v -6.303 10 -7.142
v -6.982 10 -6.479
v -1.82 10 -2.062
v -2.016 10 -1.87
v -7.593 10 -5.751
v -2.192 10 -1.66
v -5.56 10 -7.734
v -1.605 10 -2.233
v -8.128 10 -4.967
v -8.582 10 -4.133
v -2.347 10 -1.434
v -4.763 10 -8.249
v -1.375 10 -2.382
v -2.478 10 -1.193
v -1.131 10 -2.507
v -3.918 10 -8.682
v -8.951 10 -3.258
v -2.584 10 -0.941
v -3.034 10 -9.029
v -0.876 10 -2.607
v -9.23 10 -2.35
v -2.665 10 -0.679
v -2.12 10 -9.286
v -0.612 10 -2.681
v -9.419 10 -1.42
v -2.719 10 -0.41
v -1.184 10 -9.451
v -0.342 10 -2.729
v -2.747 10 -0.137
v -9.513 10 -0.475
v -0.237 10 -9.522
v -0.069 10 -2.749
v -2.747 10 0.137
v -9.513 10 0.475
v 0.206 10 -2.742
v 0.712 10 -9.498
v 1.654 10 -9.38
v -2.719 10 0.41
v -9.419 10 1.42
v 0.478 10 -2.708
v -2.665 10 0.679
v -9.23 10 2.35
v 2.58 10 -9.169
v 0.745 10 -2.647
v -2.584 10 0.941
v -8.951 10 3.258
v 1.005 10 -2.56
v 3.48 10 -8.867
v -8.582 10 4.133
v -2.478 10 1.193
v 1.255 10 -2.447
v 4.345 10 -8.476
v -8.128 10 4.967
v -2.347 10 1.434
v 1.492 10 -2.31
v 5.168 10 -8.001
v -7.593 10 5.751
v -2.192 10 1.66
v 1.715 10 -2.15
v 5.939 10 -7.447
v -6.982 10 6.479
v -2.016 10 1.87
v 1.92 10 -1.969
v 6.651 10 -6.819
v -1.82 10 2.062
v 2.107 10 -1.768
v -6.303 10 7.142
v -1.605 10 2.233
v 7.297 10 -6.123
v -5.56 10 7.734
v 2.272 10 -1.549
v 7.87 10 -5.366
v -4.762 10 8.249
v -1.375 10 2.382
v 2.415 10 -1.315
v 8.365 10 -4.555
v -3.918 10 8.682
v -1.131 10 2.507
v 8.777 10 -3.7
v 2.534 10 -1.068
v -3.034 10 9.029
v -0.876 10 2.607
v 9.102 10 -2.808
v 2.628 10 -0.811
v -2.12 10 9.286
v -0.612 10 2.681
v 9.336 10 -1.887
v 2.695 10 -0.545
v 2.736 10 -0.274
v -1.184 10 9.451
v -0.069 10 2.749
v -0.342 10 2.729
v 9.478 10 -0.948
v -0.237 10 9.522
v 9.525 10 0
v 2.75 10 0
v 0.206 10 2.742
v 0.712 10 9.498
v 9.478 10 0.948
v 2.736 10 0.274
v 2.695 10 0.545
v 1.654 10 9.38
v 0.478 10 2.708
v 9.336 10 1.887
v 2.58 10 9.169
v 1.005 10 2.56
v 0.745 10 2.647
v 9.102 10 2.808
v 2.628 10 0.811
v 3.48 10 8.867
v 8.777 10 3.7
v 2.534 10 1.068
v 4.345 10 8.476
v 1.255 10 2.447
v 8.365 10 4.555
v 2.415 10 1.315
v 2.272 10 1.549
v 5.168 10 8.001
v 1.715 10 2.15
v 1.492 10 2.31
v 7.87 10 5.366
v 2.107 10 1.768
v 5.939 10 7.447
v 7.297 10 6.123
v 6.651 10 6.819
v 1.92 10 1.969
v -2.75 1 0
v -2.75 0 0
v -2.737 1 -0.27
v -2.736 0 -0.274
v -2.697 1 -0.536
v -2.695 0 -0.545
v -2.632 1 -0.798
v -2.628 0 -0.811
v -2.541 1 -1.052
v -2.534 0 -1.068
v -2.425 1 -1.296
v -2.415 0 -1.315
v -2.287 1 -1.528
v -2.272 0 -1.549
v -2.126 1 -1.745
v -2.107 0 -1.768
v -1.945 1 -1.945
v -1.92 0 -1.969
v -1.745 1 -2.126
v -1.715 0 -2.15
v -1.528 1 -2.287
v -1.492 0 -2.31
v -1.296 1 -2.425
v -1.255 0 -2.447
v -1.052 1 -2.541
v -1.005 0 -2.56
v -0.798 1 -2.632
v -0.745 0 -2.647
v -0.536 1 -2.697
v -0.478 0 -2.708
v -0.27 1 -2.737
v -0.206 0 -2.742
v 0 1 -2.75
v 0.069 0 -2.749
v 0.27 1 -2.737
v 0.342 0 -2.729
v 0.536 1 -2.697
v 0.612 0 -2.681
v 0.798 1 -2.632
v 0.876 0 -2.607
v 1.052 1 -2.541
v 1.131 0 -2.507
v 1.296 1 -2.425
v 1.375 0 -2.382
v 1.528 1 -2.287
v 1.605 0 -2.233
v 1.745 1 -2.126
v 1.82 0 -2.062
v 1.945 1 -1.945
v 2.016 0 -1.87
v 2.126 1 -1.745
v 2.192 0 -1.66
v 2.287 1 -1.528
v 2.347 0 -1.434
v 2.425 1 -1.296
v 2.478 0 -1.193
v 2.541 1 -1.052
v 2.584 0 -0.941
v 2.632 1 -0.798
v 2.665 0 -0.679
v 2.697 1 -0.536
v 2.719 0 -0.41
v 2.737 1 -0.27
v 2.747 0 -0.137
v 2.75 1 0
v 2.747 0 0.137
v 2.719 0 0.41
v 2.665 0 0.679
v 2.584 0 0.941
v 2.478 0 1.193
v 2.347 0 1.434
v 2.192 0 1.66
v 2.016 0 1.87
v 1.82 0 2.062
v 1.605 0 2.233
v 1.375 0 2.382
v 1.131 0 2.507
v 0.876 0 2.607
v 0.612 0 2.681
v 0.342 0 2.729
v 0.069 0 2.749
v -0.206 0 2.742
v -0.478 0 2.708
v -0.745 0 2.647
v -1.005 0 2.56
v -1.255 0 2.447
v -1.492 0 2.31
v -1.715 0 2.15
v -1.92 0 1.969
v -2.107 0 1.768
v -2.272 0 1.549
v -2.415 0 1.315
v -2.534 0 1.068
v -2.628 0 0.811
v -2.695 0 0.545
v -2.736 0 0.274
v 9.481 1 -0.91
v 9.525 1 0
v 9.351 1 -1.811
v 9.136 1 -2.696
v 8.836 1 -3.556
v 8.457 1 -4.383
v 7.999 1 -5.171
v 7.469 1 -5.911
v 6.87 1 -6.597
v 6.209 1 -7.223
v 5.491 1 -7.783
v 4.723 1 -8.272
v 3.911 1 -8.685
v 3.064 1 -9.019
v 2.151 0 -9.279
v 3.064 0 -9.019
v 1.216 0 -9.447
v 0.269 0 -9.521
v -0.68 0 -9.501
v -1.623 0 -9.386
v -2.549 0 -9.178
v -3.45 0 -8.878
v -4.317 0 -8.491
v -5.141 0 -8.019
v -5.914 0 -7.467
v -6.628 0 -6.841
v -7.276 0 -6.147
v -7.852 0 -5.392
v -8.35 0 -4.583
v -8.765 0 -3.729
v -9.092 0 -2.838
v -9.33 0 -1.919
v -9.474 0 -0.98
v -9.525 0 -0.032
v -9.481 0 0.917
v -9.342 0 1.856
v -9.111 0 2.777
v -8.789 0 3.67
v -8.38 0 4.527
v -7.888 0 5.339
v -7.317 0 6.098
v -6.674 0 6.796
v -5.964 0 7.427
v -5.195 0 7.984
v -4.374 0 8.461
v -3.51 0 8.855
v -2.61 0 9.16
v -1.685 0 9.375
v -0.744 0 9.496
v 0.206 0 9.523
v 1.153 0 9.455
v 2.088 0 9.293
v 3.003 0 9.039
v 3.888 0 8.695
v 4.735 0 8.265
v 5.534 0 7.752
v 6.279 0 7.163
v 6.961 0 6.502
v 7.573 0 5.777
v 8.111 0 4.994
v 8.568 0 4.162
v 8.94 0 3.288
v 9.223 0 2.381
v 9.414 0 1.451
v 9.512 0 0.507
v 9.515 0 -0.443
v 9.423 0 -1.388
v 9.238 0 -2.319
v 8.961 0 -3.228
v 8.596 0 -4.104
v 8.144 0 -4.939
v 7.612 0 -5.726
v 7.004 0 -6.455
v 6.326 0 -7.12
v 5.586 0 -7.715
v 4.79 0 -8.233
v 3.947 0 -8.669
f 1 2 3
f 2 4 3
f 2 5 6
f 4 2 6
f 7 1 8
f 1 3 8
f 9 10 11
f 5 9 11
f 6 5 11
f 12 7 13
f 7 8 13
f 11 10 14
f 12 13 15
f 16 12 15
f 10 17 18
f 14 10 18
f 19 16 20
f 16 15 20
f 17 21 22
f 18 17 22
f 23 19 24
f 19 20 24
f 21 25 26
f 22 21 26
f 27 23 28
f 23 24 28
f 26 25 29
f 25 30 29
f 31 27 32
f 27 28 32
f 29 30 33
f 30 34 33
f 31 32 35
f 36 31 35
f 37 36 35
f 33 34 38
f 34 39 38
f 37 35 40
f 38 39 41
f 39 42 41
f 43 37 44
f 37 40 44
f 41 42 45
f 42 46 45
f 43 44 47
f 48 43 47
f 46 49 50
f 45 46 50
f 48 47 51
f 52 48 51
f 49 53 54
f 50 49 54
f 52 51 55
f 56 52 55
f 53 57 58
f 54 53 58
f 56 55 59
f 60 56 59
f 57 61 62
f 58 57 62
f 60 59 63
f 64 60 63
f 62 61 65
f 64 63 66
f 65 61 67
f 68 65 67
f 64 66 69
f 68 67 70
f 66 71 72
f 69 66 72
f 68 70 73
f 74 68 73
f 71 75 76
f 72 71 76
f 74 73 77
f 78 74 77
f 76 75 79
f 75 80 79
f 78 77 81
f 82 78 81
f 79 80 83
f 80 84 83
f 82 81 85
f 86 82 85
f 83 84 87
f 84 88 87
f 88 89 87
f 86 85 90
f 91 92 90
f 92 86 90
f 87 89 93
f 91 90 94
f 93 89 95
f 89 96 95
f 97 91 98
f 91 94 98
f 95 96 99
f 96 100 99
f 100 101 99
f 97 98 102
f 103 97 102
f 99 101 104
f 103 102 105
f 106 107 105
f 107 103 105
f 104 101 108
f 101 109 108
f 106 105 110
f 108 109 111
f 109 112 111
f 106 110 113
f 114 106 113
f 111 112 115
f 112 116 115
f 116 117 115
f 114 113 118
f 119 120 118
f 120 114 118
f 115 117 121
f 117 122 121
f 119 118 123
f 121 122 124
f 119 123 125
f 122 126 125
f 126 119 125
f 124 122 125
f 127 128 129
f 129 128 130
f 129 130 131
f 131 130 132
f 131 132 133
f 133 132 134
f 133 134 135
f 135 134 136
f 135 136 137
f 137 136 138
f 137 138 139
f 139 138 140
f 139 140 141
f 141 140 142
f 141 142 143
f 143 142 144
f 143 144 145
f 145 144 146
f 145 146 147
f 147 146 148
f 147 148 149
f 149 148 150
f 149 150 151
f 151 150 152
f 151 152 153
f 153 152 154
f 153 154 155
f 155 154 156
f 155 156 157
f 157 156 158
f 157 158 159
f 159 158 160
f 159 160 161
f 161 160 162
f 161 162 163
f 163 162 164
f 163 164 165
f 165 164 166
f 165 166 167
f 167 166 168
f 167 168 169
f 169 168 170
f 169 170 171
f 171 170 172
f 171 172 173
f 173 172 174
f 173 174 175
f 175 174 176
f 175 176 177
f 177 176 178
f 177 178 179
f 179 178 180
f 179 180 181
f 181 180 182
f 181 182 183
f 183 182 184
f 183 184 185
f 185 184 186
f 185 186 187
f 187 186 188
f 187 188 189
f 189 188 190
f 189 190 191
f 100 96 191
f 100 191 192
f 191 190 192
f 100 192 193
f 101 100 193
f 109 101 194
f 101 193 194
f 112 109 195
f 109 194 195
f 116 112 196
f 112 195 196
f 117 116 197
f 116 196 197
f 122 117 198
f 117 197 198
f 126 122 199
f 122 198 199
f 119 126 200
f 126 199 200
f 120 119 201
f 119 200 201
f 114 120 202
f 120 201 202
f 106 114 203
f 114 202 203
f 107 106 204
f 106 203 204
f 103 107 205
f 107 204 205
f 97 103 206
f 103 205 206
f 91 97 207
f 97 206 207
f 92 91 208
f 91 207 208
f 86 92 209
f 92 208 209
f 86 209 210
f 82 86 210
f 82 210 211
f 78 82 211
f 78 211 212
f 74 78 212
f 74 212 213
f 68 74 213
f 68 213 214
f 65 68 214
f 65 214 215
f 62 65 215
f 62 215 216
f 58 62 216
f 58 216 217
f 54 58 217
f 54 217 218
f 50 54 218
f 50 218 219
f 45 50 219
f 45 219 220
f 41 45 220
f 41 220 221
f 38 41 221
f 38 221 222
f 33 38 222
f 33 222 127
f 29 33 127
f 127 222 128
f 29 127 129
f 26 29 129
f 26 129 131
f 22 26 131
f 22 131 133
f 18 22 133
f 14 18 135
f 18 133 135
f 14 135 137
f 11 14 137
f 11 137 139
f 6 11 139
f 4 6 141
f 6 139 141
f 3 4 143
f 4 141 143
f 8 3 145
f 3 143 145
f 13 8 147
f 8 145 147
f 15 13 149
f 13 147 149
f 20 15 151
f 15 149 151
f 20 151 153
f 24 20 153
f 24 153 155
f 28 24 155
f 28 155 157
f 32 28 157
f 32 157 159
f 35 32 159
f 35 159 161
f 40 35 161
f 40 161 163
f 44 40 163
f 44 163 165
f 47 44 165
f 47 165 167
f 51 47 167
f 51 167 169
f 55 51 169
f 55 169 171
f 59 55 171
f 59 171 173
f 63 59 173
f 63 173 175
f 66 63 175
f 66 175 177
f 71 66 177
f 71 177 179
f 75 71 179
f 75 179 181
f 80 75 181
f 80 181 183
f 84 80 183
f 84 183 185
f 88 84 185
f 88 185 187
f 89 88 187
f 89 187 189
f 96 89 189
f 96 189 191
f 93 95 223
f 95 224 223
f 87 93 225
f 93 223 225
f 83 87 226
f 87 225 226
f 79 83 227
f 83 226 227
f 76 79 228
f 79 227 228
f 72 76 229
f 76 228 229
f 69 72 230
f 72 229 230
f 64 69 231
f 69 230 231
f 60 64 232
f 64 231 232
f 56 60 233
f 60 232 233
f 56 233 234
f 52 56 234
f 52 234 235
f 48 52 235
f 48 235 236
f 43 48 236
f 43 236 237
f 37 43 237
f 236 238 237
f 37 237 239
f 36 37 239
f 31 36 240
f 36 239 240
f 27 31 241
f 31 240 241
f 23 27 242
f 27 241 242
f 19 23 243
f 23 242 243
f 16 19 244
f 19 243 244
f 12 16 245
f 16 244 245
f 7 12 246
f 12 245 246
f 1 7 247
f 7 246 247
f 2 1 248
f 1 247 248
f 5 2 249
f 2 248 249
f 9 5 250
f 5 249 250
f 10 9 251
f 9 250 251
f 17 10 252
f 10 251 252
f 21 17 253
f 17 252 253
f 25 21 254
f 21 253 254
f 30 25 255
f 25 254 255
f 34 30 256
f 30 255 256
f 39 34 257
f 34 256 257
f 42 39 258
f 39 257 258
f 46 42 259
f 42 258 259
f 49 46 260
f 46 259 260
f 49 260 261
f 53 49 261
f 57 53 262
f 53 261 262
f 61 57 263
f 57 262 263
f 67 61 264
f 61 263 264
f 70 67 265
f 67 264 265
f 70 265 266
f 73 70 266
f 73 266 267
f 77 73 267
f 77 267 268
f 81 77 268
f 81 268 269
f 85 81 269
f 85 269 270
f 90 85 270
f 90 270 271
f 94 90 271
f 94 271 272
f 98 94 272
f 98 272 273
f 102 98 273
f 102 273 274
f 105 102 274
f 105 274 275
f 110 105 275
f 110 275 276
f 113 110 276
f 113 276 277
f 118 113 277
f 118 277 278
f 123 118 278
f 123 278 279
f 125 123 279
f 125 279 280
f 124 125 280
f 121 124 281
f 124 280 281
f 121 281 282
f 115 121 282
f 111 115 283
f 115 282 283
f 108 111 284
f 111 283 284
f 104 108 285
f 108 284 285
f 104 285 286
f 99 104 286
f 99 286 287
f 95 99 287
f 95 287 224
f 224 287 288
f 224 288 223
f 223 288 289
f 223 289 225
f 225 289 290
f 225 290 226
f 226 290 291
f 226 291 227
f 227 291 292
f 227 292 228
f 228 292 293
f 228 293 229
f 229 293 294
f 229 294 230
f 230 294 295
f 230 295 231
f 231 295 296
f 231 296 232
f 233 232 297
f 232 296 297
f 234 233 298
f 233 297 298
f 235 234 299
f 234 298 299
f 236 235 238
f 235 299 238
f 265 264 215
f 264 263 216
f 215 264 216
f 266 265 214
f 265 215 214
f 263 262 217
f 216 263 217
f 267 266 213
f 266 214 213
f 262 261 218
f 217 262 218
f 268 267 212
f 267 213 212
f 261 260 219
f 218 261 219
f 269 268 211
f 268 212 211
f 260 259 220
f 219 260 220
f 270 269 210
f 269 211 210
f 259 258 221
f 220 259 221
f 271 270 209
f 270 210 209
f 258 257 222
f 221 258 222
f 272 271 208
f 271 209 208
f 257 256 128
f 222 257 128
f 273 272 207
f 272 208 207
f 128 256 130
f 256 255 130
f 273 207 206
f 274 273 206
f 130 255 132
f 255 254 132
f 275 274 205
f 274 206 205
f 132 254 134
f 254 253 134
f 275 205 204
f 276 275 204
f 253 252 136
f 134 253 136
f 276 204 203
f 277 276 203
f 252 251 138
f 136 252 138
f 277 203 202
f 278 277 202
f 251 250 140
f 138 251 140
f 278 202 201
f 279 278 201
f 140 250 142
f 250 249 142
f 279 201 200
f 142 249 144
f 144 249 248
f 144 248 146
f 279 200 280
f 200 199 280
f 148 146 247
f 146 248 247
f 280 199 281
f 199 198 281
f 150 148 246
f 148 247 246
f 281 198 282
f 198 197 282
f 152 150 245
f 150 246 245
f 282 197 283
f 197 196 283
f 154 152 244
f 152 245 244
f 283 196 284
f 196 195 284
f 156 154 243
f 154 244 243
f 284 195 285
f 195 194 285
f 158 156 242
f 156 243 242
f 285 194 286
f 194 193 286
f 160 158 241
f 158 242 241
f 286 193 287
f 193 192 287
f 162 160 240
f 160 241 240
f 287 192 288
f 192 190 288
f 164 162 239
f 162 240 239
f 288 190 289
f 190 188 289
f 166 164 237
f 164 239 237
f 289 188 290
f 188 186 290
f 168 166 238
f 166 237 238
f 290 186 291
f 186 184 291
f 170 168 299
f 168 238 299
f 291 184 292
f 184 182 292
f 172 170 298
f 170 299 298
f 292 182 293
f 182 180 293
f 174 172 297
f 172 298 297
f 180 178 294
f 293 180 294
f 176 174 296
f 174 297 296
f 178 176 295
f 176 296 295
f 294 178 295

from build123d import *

# Parameters (mm, degrees)
SKETCH2_R               = 9.525
BOSS_EXTRUDE1_DEPTH     = 1
M5_CLEARANCE_HOLE1_D    = 5.5
CUT_EXTRUDE1_DEPTH      = 1
CUT_EXTRUDE1_DEPTH_BACK = 2
SKETCH9_R               = 9.525
SKETCH9_R_2             = 2.75
BOSS_EXTRUDE2_DEPTH     = 10


with BuildPart() as part:
    # Sketch2 → Boss-Extrude1 (new body)
    with BuildSketch(Plane(origin=(0, 0, 0), x_dir=(1, 0, 0), z_dir=(0, 1, 0))):
        Circle(SKETCH2_R)
    extrude(amount=BOSS_EXTRUDE1_DEPTH)

    # M5 Clearance Hole1 (through all)
    with Locations(Plane(origin=(0, 1, 0), x_dir=(1, 0, 0), z_dir=(0, 1, 0))):
        with Locations((0, 0)):
            Hole(M5_CLEARANCE_HOLE1_D / 2)

    # Sketch7 → Cut-Extrude1 (cut, two sides)
    with BuildSketch(Plane(origin=(0, 1, 0), x_dir=(1, 0, 0), z_dir=(0, 1, 0))) as cut_extrude1_sk:
        Polygon((3.063849251, 9.018783331), (-3.927822903, 8.677432353), (-3.960317229, 9.342992692), (3.031354925, 9.68434367), align=None)
    extrude(amount=CUT_EXTRUDE1_DEPTH, mode=Mode.SUBTRACT)
    extrude(cut_extrude1_sk.sketch, amount=-CUT_EXTRUDE1_DEPTH_BACK, mode=Mode.SUBTRACT)

    # Sketch9 → Boss-Extrude2 (add)
    with BuildSketch(Plane.XZ):
        Circle(SKETCH9_R)
        Circle(SKETCH9_R_2, mode=Mode.SUBTRACT)
    extrude(amount=-BOSS_EXTRUDE2_DEPTH)


solid = part.part
